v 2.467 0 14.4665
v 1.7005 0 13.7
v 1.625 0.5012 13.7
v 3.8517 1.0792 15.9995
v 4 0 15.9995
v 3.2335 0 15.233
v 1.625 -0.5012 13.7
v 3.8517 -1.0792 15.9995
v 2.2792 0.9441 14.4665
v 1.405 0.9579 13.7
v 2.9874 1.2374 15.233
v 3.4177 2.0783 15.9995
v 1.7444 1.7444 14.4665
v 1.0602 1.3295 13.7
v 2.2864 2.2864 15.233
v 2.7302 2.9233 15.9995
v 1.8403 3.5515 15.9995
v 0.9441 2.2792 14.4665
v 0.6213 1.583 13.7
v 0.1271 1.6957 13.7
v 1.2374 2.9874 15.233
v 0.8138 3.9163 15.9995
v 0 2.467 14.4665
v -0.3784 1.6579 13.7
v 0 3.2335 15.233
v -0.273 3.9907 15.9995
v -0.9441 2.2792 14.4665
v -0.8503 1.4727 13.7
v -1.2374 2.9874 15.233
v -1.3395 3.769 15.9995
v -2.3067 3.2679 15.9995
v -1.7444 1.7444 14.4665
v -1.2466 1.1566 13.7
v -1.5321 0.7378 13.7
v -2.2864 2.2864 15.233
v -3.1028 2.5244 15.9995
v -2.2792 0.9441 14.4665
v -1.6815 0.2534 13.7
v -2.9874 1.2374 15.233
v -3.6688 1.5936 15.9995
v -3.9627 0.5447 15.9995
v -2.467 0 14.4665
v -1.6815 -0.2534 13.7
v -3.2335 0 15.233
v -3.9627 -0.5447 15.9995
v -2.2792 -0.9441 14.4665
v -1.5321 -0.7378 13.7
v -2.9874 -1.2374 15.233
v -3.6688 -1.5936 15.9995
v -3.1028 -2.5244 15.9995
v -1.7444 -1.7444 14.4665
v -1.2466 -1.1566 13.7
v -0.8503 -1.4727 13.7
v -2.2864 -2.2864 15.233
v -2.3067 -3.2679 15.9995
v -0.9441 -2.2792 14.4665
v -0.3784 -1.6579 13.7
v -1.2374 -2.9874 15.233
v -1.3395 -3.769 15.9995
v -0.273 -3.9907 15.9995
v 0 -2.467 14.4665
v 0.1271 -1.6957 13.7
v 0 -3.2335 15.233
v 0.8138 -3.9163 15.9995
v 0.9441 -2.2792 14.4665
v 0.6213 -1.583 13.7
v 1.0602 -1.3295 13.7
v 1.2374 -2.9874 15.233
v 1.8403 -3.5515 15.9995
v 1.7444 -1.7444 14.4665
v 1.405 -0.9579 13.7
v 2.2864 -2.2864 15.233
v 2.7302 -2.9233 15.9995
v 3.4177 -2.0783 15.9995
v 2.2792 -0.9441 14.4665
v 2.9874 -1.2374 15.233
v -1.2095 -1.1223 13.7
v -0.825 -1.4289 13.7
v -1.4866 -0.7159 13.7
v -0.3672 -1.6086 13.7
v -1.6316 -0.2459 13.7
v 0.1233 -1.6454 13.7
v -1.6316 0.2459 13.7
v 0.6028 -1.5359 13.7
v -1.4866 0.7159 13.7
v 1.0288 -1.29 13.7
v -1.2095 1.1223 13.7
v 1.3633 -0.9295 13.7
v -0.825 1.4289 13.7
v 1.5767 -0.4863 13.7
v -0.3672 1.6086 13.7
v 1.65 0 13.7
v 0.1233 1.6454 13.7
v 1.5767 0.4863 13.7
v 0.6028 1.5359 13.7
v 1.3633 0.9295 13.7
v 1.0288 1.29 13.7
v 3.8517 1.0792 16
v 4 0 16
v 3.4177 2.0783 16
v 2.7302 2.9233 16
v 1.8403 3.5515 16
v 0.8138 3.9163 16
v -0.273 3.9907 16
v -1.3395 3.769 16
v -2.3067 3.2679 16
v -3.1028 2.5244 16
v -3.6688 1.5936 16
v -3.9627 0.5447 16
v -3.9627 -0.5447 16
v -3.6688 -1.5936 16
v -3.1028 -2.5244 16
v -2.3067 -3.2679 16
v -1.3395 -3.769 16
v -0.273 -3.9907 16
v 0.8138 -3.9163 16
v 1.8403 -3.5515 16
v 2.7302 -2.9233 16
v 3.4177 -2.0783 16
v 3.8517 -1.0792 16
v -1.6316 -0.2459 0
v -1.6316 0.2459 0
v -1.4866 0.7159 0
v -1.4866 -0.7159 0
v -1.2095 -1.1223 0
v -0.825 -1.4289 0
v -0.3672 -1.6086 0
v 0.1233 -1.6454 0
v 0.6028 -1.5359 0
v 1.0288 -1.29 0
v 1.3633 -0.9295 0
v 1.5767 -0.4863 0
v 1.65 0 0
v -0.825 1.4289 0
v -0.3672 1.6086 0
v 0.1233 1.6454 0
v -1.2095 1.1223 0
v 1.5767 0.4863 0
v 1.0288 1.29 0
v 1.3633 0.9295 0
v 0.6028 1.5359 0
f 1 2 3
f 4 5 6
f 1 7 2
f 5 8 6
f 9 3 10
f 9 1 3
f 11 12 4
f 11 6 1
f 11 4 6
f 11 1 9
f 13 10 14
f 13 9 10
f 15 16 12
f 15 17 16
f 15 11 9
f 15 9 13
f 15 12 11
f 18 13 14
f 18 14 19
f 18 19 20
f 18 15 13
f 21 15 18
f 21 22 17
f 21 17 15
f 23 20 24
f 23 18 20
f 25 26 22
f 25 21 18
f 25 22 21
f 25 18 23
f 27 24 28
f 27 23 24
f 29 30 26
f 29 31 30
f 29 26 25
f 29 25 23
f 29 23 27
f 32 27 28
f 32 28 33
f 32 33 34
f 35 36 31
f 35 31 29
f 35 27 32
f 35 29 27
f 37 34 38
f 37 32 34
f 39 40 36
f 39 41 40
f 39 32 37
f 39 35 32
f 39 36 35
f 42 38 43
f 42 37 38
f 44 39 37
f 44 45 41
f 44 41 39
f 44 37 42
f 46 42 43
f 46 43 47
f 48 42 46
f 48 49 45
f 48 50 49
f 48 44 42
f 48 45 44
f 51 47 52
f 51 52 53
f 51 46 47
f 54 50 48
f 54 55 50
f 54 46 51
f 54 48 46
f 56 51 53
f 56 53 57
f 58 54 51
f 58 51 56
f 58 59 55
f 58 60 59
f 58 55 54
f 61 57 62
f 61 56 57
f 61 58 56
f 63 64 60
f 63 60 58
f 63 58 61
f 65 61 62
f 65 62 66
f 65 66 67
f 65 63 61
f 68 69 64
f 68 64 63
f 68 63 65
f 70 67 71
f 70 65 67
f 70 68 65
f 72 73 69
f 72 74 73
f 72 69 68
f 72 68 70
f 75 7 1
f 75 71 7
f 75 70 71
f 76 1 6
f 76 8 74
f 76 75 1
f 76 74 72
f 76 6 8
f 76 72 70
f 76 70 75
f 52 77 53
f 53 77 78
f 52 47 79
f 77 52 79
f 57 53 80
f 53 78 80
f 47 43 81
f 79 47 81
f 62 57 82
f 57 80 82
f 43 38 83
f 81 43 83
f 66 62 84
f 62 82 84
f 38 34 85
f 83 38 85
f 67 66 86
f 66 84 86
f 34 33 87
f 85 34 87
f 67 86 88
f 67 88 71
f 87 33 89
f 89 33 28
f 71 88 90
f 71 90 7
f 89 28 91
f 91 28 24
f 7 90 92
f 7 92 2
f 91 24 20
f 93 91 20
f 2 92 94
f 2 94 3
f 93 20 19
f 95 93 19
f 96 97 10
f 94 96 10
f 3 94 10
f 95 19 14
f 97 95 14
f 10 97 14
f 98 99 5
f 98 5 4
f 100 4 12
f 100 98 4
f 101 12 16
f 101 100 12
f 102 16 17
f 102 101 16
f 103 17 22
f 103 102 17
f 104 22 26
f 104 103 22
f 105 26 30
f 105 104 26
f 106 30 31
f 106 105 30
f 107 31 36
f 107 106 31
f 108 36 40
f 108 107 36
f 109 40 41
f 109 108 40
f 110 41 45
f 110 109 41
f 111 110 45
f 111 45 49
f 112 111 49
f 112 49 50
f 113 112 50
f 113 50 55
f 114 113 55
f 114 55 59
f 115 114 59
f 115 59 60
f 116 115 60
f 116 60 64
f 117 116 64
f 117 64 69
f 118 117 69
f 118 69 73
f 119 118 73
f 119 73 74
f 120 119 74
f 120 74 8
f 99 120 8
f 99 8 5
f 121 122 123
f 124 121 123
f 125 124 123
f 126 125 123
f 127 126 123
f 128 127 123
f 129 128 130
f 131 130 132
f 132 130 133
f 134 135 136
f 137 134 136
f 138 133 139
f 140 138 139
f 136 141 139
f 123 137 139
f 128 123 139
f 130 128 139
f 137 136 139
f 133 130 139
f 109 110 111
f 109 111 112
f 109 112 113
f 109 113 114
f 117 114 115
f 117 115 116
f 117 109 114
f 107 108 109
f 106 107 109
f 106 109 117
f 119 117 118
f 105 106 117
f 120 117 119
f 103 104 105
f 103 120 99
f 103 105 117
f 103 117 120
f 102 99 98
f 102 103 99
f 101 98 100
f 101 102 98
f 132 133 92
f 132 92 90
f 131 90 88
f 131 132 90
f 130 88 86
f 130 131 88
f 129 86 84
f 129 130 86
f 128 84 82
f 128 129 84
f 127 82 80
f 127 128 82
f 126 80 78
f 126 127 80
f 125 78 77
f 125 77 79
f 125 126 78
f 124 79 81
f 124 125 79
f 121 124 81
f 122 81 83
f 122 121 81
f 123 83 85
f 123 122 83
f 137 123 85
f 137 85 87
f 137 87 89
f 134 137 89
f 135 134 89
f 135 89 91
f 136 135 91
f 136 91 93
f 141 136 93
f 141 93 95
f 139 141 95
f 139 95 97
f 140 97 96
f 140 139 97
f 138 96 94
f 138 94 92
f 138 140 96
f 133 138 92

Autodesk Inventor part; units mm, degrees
ref_plane "YZ Plane" through (0, 0, 0) normal (1, 0, 0) x (0, 1, 0)
ref_plane "XZ Plane" through (0, 0, 0) normal (0, 1, 0) x (-1, 0, 0)
ref_plane "XY Plane" through (0, 0, 0) normal (0, 0, 1) x (1, 0, 0)
sketch "スケッチ1" plane through (0, 0, 0) normal (0, 0, 1) x (1, 0, 0)
  circle A0 centre (0, 0) radius 1.65
  dimension "d0" = 3.3
extrude "押し出し1" add sketch "スケッチ1" along normal blind 16
sketch "スケッチ2" plane through (0, 0, 16) normal (0, 0, 1) x (1, 0, 0)
  circle A0 centre (0, 0) radius 4
  dimension "d3" = 8
extrude "押し出し2" add sketch "スケッチ2" against normal blind 2.3
chamfer "面取り1" distance 2.3 angle 45 1 edges at (-4, 0, 13.7)
thread "ねじ1" size "M3.5x0.6" class "6g" standard "ANSI Metric M Profile" full length
properties part number "ネジ皿m4,16" material "鋼、高強度、低合金"
